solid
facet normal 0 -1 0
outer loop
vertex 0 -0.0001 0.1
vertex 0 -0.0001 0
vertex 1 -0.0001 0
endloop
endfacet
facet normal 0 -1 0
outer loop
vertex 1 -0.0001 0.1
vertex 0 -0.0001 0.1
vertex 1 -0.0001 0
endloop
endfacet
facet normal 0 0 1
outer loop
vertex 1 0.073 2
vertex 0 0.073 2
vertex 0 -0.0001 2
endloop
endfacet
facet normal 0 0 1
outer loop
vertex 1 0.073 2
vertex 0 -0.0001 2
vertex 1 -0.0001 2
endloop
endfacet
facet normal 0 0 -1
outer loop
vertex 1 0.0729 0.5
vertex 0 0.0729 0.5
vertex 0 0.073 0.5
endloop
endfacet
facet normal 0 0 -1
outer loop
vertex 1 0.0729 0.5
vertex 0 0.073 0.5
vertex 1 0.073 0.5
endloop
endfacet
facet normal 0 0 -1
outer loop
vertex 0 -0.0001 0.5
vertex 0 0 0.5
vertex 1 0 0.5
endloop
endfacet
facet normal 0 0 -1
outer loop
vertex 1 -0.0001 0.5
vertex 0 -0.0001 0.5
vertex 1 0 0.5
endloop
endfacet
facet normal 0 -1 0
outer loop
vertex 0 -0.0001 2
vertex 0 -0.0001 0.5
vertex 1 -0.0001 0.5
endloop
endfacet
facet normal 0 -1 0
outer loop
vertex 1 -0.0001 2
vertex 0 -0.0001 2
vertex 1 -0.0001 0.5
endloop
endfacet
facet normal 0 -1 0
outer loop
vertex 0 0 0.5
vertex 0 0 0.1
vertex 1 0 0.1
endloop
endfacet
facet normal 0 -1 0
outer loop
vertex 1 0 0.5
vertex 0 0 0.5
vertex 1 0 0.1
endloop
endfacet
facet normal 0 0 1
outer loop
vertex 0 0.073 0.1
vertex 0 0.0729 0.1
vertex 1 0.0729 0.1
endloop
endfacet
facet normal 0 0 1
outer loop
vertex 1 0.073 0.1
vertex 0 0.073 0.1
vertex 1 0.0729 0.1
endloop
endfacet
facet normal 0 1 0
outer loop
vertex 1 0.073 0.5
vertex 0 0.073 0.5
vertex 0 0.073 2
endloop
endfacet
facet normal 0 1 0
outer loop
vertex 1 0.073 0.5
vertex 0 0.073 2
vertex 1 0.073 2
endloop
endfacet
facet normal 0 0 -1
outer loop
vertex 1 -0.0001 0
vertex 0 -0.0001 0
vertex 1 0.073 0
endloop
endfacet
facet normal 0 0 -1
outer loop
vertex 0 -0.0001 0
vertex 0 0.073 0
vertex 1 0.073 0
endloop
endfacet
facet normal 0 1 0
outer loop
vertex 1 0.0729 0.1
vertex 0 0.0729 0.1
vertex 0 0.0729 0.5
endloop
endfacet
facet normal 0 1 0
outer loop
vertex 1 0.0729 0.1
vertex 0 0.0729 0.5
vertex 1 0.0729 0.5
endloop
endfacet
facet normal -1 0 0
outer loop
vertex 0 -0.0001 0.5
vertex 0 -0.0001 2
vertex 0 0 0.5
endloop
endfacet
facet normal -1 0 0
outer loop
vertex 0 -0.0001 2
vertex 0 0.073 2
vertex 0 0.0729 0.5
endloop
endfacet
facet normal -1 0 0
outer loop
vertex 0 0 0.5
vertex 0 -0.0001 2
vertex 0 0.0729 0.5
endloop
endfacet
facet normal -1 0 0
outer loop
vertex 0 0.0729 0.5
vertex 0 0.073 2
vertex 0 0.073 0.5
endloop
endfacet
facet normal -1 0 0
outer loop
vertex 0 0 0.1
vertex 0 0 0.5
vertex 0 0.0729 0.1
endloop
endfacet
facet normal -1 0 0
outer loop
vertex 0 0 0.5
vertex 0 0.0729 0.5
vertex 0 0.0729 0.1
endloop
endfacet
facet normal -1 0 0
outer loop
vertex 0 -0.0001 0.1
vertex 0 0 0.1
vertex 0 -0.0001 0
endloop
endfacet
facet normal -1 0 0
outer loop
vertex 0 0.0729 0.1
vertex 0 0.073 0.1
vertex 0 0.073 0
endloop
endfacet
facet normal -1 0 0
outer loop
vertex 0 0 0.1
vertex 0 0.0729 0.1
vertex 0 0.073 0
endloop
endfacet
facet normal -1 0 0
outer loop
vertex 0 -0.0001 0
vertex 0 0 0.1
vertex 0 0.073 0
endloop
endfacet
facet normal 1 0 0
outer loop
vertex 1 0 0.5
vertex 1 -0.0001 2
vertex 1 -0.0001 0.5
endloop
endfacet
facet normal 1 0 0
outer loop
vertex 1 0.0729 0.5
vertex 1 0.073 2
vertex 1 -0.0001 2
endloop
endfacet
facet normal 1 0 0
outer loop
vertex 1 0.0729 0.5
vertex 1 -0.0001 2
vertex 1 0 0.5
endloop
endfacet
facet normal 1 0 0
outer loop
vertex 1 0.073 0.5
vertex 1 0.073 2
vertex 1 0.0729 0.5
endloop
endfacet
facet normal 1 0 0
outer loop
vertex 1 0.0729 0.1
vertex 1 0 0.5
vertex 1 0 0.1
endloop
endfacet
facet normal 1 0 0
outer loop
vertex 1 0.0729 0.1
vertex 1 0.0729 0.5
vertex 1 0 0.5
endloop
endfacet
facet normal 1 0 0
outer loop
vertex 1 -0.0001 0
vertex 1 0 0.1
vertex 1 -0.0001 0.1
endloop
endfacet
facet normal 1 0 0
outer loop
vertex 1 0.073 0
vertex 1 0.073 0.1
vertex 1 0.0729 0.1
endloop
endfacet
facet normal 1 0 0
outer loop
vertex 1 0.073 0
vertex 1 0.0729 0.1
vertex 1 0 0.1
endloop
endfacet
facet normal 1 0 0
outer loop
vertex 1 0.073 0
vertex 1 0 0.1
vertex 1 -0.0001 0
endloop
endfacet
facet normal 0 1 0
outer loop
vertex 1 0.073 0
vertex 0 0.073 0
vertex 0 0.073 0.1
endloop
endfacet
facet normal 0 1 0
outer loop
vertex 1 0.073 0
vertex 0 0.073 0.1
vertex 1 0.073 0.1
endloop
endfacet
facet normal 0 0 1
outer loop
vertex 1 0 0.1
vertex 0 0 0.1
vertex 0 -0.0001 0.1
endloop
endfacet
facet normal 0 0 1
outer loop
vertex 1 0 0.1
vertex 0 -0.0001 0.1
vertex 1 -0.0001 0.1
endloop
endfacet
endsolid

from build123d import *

# Parameters (mm, degrees)
SKETCH1_W           = 1
SKETCH1_H           = 0.072865
BOSS_EXTRUDE1_DEPTH = 2
SKETCH7_W           = 1
SKETCH7_H           = 0.1
SKETCH7_H_2         = 1.5
BOSS_EXTRUDE6_DEPTH = 0.0001
BOSS_EXTRUDE7_START = -0.072865
SKETCH7_2_W         = 1
SKETCH7_2_H         = 0.1
SKETCH7_2_H_2       = 1.5
BOSS_EXTRUDE7_DEPTH = 0.0001


with BuildPart() as part:
    # Sketch1 → Boss-Extrude1 (new body)
    with BuildSketch(Plane.XY):
        with Locations((0.5, 0.0364325)):
            Rectangle(SKETCH1_W, SKETCH1_H)
    extrude(amount=BOSS_EXTRUDE1_DEPTH)

    # Sketch7 → Boss-Extrude6 (add)
    with BuildSketch(Plane(origin=(0, 0.072865, 0), x_dir=(1, 0, 0), z_dir=(0, 1, 0))):
        with Locations((0.5, -0.05)):
            Rectangle(SKETCH7_W, SKETCH7_H)
        with Locations((0.5, -1.25)):
            Rectangle(SKETCH7_W, SKETCH7_H_2)
    extrude(amount=BOSS_EXTRUDE6_DEPTH)

    # Sketch7<2> → Boss-Extrude7 (add)
    with BuildSketch(Plane(origin=(0, 0.072865, 0), x_dir=(1, 0, 0), z_dir=(0, 1, 0)).offset(BOSS_EXTRUDE7_START)):
        with Locations((0.5, -0.05)):
            Rectangle(SKETCH7_2_W, SKETCH7_2_H)
        with Locations((0.5, -1.25)):
            Rectangle(SKETCH7_2_W, SKETCH7_2_H_2)
    extrude(amount=-BOSS_EXTRUDE7_DEPTH)


solid = part.part
